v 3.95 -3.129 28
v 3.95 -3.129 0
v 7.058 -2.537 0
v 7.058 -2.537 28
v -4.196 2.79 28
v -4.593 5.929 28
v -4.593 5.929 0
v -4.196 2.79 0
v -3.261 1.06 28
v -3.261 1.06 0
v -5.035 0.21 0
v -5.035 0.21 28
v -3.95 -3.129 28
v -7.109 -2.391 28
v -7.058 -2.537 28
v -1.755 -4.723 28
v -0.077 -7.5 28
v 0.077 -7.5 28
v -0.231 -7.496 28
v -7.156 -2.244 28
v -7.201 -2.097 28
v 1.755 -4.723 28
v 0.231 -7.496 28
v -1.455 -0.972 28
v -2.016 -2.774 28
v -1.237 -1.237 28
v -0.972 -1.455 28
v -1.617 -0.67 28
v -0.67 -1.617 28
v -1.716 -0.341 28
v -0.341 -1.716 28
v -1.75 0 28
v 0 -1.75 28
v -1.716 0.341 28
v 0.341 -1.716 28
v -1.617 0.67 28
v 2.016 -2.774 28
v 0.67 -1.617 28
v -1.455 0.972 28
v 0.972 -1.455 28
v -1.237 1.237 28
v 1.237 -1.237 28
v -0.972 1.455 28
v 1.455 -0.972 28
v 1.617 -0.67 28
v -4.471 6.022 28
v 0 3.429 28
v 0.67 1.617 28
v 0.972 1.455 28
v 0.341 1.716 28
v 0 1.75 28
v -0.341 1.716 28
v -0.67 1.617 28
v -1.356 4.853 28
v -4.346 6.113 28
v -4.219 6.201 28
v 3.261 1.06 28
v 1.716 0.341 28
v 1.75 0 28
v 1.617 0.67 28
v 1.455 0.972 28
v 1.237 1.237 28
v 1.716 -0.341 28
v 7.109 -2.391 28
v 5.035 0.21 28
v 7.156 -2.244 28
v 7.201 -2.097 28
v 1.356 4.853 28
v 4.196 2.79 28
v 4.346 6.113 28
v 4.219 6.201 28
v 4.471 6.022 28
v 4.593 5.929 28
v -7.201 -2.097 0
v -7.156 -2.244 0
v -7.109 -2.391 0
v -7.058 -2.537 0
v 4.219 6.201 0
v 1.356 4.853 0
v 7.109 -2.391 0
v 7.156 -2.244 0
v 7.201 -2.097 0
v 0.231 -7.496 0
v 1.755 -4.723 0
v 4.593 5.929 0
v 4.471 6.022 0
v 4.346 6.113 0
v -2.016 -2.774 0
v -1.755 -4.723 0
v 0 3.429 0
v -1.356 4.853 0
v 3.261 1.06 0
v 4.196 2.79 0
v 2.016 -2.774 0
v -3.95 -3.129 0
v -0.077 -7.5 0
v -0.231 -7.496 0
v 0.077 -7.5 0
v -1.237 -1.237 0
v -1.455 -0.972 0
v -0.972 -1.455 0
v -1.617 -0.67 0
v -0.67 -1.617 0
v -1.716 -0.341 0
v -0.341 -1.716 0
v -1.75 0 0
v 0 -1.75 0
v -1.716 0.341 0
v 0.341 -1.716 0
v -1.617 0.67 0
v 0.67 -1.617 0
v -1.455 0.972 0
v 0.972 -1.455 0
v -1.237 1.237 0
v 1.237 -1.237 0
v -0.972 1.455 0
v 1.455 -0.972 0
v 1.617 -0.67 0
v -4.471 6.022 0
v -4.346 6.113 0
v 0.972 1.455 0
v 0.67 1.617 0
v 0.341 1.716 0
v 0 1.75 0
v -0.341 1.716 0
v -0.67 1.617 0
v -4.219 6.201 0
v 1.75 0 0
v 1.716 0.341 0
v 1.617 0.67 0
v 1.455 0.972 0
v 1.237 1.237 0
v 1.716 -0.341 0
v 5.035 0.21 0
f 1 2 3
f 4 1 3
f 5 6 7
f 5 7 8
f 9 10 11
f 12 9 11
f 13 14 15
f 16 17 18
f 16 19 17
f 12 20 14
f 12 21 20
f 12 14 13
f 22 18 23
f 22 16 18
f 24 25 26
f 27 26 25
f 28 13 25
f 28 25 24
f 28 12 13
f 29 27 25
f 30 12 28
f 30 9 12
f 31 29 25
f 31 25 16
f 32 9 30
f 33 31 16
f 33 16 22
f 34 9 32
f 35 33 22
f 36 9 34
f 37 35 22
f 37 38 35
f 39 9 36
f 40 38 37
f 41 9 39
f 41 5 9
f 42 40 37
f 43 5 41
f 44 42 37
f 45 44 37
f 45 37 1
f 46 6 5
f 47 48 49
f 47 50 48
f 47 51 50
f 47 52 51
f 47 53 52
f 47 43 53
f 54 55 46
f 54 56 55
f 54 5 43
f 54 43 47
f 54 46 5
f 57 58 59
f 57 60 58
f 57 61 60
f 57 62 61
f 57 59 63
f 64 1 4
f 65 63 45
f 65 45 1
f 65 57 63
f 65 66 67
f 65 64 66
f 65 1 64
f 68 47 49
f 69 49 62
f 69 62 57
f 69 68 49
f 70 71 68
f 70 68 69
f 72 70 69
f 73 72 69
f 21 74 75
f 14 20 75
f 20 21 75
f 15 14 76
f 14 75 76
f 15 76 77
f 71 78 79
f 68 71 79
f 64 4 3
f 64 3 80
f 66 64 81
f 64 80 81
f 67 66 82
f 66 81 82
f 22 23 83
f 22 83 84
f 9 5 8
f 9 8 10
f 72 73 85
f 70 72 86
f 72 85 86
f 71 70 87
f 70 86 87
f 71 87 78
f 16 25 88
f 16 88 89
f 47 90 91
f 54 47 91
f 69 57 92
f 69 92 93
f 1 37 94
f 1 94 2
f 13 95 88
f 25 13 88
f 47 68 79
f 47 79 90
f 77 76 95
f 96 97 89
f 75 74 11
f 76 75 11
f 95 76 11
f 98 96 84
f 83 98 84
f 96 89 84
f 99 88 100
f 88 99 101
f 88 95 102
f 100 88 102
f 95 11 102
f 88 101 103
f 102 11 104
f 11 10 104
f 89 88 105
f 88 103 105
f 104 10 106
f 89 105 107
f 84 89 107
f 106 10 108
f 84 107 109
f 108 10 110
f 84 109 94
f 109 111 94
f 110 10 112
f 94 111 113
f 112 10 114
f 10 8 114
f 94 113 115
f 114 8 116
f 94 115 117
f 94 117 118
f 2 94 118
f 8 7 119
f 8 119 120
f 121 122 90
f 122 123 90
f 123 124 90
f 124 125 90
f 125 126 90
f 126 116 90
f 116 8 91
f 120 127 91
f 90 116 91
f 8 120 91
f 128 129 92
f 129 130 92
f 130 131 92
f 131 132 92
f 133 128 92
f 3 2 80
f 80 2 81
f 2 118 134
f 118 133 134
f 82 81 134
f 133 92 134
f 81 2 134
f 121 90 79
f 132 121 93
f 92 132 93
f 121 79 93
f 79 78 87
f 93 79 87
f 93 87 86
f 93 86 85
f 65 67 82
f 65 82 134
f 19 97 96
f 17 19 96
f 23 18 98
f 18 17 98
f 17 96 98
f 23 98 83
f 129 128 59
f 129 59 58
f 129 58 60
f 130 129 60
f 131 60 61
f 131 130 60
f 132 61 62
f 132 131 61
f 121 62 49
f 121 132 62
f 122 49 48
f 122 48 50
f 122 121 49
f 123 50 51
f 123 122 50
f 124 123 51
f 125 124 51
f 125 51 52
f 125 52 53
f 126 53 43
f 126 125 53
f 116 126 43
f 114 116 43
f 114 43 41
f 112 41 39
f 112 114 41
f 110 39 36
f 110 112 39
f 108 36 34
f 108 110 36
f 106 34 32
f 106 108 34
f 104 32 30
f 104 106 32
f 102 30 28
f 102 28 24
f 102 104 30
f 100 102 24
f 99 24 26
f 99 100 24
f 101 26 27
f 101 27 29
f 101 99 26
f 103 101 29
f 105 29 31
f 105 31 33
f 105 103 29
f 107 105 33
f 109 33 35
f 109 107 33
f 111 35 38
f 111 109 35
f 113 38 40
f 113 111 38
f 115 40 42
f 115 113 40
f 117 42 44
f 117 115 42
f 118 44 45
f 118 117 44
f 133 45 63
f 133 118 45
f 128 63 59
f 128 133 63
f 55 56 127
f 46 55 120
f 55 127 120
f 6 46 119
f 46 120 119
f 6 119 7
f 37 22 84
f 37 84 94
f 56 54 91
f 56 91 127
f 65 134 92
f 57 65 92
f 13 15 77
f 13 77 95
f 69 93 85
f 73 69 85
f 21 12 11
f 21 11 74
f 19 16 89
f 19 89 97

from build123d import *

# Parameters (mm, degrees)
SKETCH1_R           = 7.5
SKETCH1_R_2         = 1.75
BOSS_EXTRUDE1_DEPTH = 28
CUT_EXTRUDE1_DEPTH  = 30.941609843
CIRPATTERN1_COUNT   = 5


with BuildPart() as part:
    # Sketch1 → Boss-Extrude1 (new body)
    with BuildSketch(Plane.XY):
        Circle(SKETCH1_R)
        Circle(SKETCH1_R_2, mode=Mode.SUBTRACT)
    extrude(amount=BOSS_EXTRUDE1_DEPTH)

    # Sketch2 → Cut-Extrude1 (cut, through all)
    with BuildSketch(Plane.XY):
        Polygon((0, 3.429306859), (-1.35645876, 4.852854397), (-4.219139018, 6.200714954), (0, 11.25164702), (4.219139018, 6.200714954), (1.35645876, 4.852854397), align=None)
    cut_extrude1 = extrude(amount=CUT_EXTRUDE1_DEPTH, mode=Mode.SUBTRACT)

    # CirPattern1: Cut-Extrude1 ×5 about axis
    cirpattern1_axis = Axis((0, 0, 0), (0, 0, 1))
    for i in range(1, CIRPATTERN1_COUNT):
        add(cut_extrude1.rotate(cirpattern1_axis, i * 360 / CIRPATTERN1_COUNT), mode=Mode.SUBTRACT)


solid = part.part
